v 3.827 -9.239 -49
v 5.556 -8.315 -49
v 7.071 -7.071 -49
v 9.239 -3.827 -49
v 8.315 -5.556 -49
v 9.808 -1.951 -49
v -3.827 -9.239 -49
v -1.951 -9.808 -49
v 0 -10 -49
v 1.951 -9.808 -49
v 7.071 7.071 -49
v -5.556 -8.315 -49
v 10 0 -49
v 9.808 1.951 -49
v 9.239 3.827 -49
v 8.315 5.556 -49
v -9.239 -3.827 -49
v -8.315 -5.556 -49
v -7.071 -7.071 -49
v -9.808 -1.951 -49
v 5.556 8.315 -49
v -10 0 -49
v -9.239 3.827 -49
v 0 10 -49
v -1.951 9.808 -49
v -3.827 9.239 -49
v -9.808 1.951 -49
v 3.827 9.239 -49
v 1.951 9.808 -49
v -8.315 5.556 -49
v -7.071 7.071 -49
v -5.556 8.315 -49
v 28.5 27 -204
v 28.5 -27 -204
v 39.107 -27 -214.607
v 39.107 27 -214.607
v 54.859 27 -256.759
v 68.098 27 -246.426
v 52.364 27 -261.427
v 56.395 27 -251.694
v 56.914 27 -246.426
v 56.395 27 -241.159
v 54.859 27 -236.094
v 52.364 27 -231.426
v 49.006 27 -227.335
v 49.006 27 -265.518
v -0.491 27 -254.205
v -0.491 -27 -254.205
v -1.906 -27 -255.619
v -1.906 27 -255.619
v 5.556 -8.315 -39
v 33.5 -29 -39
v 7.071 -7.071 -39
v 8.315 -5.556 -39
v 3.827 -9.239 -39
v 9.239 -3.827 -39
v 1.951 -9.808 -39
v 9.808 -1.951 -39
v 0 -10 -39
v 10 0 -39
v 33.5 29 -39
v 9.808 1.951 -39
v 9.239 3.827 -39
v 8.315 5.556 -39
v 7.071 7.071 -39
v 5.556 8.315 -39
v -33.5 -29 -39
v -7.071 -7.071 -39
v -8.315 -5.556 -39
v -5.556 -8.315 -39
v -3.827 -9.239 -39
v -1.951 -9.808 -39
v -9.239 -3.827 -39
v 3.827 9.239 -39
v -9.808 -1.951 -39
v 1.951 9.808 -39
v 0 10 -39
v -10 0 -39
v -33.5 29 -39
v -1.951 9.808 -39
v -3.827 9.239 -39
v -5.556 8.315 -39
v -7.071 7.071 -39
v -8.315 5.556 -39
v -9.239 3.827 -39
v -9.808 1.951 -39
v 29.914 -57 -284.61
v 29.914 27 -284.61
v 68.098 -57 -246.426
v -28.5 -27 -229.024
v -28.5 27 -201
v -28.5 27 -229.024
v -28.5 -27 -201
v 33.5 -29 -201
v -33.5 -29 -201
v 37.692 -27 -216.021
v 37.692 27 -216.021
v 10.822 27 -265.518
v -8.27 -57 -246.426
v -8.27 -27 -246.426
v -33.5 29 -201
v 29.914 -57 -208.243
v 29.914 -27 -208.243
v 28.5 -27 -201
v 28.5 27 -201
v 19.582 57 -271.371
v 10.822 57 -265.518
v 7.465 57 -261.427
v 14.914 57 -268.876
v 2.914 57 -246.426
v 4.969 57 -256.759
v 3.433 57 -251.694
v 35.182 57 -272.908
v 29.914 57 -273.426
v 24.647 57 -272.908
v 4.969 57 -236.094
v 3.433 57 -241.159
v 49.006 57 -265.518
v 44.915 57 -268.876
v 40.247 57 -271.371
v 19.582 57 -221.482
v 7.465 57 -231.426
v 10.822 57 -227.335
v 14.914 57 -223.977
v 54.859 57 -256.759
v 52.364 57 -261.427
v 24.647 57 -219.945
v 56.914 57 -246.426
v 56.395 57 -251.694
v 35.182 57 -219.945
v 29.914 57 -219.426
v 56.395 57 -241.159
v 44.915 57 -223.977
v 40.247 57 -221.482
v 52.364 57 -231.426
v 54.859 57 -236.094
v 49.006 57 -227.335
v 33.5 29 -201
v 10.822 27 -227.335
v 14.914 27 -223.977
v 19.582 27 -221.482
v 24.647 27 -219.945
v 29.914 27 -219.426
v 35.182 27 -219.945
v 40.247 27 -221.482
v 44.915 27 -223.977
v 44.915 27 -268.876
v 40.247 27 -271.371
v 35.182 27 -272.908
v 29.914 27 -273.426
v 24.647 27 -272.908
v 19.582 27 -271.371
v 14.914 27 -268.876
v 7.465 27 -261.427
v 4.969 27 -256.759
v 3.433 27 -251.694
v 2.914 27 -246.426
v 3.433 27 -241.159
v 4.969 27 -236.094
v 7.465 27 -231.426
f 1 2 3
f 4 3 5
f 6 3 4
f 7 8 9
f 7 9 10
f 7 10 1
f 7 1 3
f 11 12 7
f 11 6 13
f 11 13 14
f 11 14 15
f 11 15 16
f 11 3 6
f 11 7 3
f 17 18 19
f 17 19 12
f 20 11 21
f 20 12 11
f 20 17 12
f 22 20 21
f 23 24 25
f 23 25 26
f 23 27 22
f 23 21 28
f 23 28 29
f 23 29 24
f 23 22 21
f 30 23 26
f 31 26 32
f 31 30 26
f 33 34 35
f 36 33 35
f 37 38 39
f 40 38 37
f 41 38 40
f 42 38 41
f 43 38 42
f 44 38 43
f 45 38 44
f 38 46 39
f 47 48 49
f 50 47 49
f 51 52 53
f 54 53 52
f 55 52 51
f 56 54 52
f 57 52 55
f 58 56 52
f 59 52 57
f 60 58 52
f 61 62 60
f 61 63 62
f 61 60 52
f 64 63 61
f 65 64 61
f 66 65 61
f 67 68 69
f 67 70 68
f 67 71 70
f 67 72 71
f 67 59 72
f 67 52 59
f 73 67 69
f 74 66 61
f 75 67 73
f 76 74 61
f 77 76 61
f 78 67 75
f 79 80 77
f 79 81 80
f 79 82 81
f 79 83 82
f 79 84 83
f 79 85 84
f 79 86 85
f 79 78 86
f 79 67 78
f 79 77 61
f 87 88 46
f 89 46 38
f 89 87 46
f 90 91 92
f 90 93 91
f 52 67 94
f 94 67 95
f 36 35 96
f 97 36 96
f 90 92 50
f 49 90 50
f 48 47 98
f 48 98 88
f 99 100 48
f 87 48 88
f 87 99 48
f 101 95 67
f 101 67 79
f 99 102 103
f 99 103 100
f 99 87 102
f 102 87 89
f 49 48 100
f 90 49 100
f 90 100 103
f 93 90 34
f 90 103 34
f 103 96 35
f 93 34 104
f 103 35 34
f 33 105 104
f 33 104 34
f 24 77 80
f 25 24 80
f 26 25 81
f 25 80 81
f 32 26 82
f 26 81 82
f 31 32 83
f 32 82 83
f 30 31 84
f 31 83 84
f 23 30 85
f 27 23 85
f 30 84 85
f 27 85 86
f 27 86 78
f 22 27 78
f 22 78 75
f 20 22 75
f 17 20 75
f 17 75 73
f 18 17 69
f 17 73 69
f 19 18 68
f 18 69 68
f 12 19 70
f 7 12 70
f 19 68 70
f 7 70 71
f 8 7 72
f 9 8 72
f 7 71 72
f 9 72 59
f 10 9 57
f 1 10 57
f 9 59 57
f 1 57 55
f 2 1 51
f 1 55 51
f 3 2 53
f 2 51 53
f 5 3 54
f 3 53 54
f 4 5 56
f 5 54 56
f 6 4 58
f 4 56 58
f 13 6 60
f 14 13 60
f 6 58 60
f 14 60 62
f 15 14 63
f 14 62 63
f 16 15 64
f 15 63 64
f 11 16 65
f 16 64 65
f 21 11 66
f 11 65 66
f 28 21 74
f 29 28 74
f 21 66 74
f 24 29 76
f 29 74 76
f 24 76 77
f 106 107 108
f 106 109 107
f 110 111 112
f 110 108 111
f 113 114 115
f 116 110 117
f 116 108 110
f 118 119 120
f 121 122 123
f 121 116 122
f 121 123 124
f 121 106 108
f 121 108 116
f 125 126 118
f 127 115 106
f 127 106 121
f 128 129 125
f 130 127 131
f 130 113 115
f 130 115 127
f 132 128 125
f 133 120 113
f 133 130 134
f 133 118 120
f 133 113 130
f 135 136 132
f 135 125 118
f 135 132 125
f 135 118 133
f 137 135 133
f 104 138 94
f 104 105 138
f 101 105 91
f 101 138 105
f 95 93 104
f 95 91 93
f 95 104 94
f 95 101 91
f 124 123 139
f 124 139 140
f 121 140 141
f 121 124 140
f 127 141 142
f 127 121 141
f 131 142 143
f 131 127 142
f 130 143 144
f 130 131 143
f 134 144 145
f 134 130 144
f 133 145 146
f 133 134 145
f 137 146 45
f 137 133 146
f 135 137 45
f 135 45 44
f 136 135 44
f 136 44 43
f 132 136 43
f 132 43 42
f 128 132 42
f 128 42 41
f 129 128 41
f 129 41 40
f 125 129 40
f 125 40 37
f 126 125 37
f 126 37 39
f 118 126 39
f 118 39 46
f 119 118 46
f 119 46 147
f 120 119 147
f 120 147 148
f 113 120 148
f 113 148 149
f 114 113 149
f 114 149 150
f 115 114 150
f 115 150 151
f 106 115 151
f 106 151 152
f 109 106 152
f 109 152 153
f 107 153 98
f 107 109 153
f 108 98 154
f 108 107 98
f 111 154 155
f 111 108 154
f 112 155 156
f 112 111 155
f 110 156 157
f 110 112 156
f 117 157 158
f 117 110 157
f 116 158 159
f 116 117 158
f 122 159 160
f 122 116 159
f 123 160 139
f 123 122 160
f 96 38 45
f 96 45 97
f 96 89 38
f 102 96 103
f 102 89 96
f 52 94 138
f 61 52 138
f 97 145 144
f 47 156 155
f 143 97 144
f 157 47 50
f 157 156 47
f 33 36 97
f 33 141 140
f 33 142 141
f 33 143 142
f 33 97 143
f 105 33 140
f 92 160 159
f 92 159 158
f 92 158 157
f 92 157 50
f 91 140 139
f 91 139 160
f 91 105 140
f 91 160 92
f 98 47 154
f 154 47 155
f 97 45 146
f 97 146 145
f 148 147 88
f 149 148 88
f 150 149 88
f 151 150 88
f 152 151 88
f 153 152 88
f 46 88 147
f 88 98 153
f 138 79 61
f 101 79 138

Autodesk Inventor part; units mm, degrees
ref_plane "YZ Plane" through (0, 0, 0) normal (1, 0, 0) x (0, 1, 0)
ref_plane "XZ Plane" through (0, 0, 0) normal (0, 1, 0) x (-1, 0, 0)
ref_plane "XY Plane" through (0, 0, 0) normal (0, 0, 1) x (1, 0, 0)
sketch "Sketch1" plane through (0, 0, 0) normal (0, 0, 1) x (1, 0, 0)
  line L0 (0, 0) -> (29, 0)
  line L1 (29, 0) -> (29, -162)
  line L2 (29, -162) -> (0, -162)
  line L3 (0, -162) -> (0, 0) construction
  line L4 (0, 0) -> (-29, 0)
  line L5 (-29, 0) -> (-29, -162)
  line L6 (-29, -162) -> (0, -162)
  dimension "d0" = 29
  dimension "d1" = 162
extrude "Extrusion1" add sketch "Sketch1" along normal mid plane 67
sketch "Sketch3" plane through (0, 0, 0) normal (1, 0, 0) x (0, 1, 0)
  line L0 (-162, 28.5) -> (-165, 28.5)
  line L1 (-165, 28.5) -> (-175.6066, 39.1066)
  line L2 (-162, 33.5) -> (0, 33.5) projected
  line L3 (-162, 33.5) -> (-162, -33.5) projected
  line L4 (-162, -28.5) -> (-190.0244, -28.5)
  line L5 (-190.0244, -28.5) -> (-216.6188, -1.9056)
  line L6 (-177.0208, 37.6924) -> (-169.2426, 29.9142)
  line L7 (-169.2426, 29.9142) -> (-207.4264, -8.2696)
  line L8 (-207.4264, -8.2696) -> (-215.2046, -0.4914)
  line L9 (-175.6066, 39.1066) -> (-177.0208, 37.6924)
  line L10 (-215.2046, -0.4914) -> (-216.6188, -1.9056)
  line L11 (0, -33.5) -> (-162, -33.5) construction
  point P0 (0, 0)
  dimension "d6" = 5
  dimension "d7" = 3
  dimension "d8" = 45
  dimension "d9" = 15
  dimension "d11" = 11
  dimension "d13" = 2
  dimension "d14" = 54
  dimension "d15" = 5
  dimension "d16" = 90
extrude "Extrusion2" add sketch "Sketch3" along normal mid plane 54
sketch "Sketch5" plane through (0, 0, 0) normal (1, 0, 0) x (0, 1, 0)
  line L0 (-207.4264, 68.098) -> (-169.2426, 29.9142)
  line L1 (-169.2426, 29.9142) -> (-207.4264, -8.2696)
  line L2 (-207.4264, -8.2696) -> (-245.6102, 29.9142)
  line L3 (-245.6102, 29.9142) -> (-207.4264, 68.098)
  line L4 (-169.2426, 29.9142) -> (-207.4264, -8.2696) projected
  line L5 (-177.0208, 37.6924) -> (-169.2426, 29.9142) projected
  line L6 (-207.4264, -8.2696) -> (-215.2046, -0.4914) projected
  point P0 (0, 0)
extrude "Extrusion3" add sketch "Sketch5" along normal mid plane 114
sketch "Sketch6" plane through (-29, 0, 33.5) normal (0, 1, 0) x (1, 0, 0)
  circle A0 centre (29, 33.5) radius 10
  dimension "d21" = 20
extrude "Extrusion4" cut sketch "Sketch6" against normal blind 10
sketch "Sketch7" plane through (57, 0, 0) normal (1, 0, 0) x (0, 0, -1)
  line L0 (-29.9142, -169.2426) -> (-68.098, -207.4264) projected
  line L1 (-68.098, -207.4264) -> (-29.9142, -245.6102) projected
  line L2 (-29.9142, -245.6102) -> (8.2696, -207.4264) projected
  line L3 (8.2696, -207.4264) -> (-29.9142, -169.2426) projected
  line L4 (-29.9142, -245.6102) -> (-29.9142, -169.2426) construction
  circle A0 centre (-29.9142, -207.4264) radius 27
  point P0 (0, 0)
extrude "Extrusion5" cut sketch "Sketch7" against normal blind 30 contours L3 A0 L0 | A0 L1 L0 | L3 L2 A0 | A0 L2 L1
move or copy body "Move Body1" bodies to move or copy 1 copy no rotation origin (0, 0, 0) rotation axis (1, 0, 0) rotation angle 90
move or copy body "Move Body2" bodies to move or copy 1 copy no rotation origin (0, 0, 0) rotation axis (0, 0, 1) rotation angle 90
move or copy body "Move Body3" bodies to move or copy 1 copy no translate (0, 0, -39)
properties part number "Sholder_Yaw"
